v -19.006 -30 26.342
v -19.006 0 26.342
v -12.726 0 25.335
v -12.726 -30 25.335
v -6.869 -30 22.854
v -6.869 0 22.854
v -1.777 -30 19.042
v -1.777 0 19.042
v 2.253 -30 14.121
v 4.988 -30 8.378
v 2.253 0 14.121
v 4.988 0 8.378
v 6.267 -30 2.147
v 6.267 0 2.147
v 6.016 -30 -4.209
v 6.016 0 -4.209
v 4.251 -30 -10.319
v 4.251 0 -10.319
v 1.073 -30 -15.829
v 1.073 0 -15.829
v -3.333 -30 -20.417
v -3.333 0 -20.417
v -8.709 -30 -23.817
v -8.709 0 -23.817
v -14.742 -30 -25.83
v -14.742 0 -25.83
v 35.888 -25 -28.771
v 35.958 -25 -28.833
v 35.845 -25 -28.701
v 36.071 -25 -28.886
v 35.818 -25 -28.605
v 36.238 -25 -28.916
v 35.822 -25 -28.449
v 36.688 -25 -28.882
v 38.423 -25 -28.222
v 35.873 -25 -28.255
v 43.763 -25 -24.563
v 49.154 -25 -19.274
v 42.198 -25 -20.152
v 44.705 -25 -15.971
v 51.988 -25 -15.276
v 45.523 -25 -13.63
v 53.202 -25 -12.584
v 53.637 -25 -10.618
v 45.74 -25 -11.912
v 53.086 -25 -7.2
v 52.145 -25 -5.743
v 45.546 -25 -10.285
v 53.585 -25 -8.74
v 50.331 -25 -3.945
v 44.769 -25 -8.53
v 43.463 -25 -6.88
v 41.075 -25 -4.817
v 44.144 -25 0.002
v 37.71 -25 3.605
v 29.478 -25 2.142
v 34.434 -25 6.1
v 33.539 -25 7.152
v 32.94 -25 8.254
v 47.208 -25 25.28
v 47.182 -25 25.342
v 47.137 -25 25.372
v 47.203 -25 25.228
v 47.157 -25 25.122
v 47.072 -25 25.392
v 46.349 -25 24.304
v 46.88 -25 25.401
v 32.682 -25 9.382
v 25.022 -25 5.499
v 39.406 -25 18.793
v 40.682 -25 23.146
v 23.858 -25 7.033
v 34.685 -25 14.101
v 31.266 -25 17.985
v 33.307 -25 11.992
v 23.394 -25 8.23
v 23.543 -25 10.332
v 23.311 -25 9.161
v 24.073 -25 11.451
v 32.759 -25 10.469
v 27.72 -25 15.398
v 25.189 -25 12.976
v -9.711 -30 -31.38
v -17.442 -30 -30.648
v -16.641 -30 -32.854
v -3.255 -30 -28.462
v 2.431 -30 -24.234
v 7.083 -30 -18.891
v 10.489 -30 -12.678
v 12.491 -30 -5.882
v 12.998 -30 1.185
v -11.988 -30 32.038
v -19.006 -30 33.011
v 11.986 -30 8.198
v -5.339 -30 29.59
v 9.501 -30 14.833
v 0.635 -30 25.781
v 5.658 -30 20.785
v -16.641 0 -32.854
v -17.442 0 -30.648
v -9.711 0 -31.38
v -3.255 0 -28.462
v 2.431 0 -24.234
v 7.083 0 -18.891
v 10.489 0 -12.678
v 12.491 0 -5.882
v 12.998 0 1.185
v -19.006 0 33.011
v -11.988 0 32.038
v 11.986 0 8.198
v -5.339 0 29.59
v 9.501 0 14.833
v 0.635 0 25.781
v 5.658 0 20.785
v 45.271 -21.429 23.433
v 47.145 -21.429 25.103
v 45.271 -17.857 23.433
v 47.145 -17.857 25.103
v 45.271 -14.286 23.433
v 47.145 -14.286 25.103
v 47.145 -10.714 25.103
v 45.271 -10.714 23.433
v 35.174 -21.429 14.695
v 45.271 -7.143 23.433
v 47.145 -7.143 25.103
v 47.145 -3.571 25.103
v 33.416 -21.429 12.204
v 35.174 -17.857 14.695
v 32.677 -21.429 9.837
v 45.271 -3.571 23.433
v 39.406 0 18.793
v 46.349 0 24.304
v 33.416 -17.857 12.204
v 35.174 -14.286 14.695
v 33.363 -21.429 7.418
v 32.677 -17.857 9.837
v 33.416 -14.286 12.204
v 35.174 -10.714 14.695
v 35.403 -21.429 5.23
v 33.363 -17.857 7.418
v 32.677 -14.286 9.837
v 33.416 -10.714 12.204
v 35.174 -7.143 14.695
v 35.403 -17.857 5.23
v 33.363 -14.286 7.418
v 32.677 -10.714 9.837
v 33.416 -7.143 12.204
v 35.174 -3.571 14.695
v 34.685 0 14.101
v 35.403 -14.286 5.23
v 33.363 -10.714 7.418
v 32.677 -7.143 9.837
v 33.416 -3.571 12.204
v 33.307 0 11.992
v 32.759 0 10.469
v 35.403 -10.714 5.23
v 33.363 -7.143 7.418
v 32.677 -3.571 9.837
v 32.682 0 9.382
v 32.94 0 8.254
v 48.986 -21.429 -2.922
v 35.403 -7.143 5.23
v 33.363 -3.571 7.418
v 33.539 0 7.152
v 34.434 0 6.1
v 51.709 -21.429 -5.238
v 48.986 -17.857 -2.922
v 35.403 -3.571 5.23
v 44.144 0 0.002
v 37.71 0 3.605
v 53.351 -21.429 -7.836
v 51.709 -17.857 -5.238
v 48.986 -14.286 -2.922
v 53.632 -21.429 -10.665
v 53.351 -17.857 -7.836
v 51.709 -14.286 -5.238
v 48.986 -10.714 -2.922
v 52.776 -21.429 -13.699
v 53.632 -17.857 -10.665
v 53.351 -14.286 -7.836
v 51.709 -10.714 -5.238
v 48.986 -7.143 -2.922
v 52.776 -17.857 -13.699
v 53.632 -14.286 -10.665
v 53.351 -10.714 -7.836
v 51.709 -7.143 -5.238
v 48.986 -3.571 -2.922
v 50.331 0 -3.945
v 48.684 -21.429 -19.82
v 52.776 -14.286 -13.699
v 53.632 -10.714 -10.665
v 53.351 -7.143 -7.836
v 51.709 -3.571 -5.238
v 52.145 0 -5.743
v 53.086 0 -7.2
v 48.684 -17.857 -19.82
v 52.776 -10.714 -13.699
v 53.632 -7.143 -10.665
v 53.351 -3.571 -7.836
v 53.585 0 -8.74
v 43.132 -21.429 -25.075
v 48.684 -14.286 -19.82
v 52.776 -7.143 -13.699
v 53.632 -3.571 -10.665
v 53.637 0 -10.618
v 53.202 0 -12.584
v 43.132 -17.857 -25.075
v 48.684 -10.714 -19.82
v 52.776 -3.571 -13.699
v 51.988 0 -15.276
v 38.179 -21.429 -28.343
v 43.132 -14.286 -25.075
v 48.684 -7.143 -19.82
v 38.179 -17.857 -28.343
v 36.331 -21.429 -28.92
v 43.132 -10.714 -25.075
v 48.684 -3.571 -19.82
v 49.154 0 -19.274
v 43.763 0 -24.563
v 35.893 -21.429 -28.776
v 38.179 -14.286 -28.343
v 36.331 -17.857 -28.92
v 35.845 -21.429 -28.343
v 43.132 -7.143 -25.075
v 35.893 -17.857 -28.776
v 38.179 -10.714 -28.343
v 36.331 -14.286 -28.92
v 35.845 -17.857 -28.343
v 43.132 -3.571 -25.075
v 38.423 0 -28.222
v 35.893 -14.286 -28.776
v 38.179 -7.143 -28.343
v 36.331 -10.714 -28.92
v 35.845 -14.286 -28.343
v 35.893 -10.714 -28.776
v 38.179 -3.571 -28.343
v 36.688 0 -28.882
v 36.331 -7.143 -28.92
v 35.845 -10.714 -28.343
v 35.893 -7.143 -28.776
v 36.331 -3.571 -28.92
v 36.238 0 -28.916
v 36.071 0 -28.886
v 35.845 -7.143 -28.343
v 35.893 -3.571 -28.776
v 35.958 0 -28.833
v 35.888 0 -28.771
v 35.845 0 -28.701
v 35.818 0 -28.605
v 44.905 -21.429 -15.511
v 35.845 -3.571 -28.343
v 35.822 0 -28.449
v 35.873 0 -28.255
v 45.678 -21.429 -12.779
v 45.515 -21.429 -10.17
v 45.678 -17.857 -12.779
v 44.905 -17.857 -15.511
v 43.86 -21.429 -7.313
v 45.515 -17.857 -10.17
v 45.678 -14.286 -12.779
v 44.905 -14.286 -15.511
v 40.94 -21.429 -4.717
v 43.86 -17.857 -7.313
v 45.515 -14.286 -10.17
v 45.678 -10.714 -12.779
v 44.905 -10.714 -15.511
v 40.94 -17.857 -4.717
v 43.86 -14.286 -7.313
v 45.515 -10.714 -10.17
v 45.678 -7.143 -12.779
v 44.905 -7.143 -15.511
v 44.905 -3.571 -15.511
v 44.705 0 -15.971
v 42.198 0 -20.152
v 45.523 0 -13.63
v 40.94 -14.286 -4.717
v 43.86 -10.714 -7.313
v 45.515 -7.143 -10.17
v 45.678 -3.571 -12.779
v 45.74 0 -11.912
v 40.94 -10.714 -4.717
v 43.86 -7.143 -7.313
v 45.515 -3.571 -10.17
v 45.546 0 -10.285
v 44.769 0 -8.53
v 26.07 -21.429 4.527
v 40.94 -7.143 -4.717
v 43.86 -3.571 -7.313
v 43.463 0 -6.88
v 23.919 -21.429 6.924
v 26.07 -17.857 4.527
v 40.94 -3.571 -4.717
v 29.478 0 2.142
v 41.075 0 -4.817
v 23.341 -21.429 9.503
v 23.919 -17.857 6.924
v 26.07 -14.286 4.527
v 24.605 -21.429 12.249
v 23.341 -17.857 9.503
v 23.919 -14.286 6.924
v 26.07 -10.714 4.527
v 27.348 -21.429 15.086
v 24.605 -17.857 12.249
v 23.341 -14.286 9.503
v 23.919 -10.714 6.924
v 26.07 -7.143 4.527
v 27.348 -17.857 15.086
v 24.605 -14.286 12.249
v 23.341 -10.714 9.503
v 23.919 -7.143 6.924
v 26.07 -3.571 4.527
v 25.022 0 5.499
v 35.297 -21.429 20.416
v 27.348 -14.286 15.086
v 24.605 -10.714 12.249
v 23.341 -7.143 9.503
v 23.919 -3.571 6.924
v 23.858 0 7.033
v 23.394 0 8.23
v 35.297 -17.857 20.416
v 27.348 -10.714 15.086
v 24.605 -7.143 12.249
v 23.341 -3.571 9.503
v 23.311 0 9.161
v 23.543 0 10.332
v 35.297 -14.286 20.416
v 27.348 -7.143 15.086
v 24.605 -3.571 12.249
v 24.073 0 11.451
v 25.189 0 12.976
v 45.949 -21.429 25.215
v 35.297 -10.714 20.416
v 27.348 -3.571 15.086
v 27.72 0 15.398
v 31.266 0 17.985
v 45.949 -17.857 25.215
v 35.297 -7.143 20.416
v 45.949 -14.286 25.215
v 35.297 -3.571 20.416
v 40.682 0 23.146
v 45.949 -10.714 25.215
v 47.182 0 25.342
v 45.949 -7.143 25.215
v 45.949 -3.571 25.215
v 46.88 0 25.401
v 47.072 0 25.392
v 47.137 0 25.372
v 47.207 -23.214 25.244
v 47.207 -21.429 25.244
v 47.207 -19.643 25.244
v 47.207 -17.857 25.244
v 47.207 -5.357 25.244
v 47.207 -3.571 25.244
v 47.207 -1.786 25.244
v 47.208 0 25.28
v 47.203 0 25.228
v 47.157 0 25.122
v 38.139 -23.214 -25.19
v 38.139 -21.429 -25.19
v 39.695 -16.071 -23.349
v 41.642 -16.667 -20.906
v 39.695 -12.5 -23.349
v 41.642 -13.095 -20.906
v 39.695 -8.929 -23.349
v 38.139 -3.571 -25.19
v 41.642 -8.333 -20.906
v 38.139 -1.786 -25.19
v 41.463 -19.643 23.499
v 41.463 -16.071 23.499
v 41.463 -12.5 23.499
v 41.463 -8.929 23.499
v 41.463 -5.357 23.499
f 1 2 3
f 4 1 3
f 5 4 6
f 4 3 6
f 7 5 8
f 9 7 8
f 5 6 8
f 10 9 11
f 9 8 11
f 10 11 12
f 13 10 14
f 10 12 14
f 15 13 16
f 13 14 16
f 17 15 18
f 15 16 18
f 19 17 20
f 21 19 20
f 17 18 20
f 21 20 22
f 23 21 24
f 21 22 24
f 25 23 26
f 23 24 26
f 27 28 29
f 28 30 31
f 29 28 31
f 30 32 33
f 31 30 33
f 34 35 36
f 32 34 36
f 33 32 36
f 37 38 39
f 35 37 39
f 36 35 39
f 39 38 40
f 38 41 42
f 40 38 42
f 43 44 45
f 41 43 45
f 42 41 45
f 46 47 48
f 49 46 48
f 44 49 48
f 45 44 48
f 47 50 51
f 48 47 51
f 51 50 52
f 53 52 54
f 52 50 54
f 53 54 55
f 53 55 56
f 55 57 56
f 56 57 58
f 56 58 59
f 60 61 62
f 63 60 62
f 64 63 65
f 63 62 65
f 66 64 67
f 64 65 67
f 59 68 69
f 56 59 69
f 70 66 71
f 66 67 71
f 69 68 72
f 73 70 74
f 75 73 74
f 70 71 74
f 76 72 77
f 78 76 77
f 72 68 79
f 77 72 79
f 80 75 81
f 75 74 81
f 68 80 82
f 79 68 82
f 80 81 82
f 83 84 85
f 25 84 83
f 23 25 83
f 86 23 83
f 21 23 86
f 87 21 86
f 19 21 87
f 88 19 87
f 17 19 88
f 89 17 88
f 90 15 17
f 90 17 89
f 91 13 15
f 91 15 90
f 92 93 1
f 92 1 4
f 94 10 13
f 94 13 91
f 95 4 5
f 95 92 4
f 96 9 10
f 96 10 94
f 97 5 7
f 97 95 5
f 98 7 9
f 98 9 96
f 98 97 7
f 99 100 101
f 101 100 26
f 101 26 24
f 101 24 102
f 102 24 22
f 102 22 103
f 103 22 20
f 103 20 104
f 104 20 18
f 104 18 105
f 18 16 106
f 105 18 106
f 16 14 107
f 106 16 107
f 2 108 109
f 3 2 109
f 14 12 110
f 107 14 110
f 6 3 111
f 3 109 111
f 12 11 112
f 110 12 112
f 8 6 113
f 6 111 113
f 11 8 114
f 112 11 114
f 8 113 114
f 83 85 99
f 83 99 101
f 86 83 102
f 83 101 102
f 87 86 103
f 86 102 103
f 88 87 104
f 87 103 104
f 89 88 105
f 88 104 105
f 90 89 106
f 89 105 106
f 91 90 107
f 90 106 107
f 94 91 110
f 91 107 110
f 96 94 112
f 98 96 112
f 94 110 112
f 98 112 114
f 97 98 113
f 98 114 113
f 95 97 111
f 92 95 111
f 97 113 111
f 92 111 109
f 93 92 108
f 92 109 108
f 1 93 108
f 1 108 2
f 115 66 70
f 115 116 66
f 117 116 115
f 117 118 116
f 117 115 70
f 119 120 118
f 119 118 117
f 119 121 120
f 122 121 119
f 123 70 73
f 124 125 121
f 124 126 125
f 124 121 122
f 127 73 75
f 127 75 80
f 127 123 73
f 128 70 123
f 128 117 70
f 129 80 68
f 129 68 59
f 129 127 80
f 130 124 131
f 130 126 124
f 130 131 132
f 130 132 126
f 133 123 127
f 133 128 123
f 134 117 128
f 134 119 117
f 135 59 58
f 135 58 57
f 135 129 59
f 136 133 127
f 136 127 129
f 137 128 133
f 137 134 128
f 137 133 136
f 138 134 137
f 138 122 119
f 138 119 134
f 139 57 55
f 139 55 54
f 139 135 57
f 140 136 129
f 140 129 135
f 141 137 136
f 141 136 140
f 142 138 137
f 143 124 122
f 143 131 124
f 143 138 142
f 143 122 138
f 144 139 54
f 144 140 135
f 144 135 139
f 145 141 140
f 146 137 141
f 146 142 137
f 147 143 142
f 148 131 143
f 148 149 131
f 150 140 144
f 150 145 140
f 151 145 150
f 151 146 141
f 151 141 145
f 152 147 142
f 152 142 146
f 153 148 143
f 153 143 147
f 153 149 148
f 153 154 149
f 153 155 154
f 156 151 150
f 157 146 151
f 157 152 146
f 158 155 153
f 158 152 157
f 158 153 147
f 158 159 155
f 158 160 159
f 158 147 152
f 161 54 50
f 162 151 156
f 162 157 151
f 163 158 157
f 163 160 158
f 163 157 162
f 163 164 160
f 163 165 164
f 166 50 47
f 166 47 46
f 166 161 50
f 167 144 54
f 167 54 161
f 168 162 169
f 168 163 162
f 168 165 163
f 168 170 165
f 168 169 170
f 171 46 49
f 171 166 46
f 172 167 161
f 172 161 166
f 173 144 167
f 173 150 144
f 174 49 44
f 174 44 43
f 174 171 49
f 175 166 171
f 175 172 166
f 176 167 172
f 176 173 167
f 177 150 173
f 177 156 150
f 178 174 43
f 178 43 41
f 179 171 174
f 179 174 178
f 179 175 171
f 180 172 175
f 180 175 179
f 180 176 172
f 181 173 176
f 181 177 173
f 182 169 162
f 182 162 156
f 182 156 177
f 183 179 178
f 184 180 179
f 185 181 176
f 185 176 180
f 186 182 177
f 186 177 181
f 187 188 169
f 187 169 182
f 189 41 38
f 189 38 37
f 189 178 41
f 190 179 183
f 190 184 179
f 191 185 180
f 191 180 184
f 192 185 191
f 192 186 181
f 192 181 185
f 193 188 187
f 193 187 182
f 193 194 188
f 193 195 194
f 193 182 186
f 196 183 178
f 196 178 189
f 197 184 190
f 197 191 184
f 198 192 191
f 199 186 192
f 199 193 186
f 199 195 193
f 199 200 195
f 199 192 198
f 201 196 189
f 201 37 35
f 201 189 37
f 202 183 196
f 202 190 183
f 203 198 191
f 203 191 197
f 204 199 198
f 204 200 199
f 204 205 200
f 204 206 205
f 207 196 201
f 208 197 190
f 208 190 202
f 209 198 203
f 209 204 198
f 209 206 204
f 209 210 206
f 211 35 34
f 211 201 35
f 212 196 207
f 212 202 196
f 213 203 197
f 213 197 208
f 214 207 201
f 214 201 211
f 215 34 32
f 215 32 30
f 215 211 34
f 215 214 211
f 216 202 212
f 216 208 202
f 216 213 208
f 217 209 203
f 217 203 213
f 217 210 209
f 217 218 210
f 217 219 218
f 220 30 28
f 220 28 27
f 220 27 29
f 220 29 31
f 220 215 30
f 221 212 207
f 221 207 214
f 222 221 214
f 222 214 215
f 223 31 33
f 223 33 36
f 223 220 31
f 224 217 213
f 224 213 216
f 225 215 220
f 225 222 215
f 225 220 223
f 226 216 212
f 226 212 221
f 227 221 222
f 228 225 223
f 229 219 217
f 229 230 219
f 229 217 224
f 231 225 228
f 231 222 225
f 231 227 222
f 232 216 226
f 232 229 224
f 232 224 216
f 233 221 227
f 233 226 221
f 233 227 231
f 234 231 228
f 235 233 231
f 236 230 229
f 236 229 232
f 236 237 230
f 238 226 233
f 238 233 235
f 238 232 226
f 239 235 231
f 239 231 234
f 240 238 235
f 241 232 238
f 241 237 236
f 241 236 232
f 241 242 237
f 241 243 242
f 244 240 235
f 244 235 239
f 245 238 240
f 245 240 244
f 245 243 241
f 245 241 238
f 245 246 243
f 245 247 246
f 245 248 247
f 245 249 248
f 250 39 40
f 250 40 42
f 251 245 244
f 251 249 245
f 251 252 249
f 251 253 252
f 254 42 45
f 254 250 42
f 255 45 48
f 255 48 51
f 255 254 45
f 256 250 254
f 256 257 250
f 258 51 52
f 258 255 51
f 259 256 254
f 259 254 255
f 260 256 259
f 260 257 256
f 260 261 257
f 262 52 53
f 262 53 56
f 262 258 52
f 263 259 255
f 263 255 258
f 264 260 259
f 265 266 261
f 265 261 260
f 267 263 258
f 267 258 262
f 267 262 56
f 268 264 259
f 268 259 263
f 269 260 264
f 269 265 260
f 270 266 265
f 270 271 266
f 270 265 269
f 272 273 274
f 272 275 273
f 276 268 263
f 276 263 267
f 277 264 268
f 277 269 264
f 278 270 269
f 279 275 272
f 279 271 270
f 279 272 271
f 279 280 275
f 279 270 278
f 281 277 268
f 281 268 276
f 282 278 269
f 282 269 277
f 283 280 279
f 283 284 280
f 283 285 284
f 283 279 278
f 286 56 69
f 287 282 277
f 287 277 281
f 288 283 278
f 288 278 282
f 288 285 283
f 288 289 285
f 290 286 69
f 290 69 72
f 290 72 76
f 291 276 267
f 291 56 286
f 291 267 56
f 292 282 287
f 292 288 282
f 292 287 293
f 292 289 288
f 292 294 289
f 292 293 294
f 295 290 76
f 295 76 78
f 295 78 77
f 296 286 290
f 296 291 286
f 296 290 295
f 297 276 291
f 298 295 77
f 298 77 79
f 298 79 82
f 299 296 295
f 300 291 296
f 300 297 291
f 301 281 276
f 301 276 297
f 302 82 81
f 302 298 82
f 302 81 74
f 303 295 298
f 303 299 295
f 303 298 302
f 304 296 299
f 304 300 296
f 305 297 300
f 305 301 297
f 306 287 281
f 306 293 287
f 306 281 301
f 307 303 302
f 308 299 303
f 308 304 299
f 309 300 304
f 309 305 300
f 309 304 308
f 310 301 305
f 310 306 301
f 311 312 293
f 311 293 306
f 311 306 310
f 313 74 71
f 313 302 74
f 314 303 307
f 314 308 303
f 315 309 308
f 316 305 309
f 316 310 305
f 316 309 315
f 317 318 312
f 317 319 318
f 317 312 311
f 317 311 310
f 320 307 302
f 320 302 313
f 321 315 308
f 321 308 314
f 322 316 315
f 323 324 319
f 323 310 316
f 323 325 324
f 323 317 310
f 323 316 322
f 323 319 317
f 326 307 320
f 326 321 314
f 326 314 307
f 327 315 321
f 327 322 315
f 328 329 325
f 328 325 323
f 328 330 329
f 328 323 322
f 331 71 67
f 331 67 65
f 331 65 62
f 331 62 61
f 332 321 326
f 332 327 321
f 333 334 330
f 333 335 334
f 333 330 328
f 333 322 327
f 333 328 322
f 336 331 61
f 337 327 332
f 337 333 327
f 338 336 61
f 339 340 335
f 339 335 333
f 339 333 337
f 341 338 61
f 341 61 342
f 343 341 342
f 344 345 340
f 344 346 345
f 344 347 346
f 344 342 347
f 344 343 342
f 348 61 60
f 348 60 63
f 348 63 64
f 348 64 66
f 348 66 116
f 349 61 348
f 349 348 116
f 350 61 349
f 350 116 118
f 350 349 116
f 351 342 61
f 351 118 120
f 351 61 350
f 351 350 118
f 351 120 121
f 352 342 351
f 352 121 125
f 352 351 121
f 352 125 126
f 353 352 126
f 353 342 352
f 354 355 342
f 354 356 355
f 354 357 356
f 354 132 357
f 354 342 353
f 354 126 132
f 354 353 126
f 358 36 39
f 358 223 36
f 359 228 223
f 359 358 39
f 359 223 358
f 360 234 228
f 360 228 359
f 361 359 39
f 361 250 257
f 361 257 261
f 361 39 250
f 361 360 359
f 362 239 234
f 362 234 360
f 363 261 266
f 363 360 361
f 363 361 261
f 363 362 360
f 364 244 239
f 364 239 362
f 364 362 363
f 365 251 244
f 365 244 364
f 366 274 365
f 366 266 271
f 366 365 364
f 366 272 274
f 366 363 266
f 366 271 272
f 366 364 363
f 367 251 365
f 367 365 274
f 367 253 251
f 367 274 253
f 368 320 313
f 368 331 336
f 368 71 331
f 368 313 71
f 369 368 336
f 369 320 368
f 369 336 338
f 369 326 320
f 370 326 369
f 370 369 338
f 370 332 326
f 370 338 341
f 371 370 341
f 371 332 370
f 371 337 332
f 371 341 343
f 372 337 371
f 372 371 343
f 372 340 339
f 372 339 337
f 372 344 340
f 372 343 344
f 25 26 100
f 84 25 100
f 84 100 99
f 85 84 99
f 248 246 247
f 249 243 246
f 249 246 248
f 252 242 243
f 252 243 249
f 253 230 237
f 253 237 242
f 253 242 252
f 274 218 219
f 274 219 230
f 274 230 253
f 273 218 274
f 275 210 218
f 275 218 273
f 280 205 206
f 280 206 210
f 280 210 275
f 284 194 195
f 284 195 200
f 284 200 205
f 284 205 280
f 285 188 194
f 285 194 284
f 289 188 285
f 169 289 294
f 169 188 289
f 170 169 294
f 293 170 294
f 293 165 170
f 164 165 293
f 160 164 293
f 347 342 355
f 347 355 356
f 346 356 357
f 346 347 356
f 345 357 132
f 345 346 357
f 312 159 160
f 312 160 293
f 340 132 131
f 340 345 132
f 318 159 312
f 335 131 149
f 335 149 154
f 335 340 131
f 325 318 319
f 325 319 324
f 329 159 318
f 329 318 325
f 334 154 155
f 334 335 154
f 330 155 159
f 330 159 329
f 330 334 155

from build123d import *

# Parameters (mm, degrees)
F1_DEPTH    = 30
F3_DEPTH    = 25
F4_T1_DEPTH = 53.5744264442


# Not quite as in the source:
# - a fillet or chamfer that OpenCascade refuses, or shapes differently, is made with other operations: its cross-section is extruded or revolved along the edge and cut away or added


with BuildPart() as f1:
    # F0 (on Front) → F1 (new body)
    with BuildSketch(Plane.XZ):
        with BuildLine():
            ThreePointArc((-16.6409582285, -32.8538838982), (12.9980630113, 1.1851974836), (-19.0061628819, 33.010661602))
            Line((-19.0061628819, 33.010661602), (-19.0061628819, 26.3418406248))
            ThreePointArc((-19.0061628819, 26.3418406248), (6.3543491175, 0), (-19.0061628819, -26.3418406248))
            Line((-19.0061628819, -26.3418406248), (-16.6409582285, -32.8538838982))
        make_face()
    extrude(amount=F1_DEPTH)

    # F4: chamfer of 5 on 1 edges, made by hand

    # F4_s2 → F4_t1 (cut)
    with BuildSketch(Plane.XZ.offset(-11.7872132221)):
        with BuildLine():
            Line((-14.6446503408, -25.6553982115), (-17.5397526272, -30.822887852))
            Line((-17.5397526272, -30.822887852), (-17.6337449938, -30.8570263203))
            ThreePointArc((-17.6337449938, -30.8570263203), (-18.2957757245, -28.5906518321), (-19.1001552485, -26.3759790931))
            Line((-19.1001552485, -26.3759790931), (-19.0099575843, -26.2419126496))
            ThreePointArc((-19.0099575843, -26.2419126496), (-16.8171091828, -26.0664335828), (-14.664619643, -25.5574123606))
            Line((-14.664619643, -25.5574123606), (-14.6446503408, -25.6553982115))
        make_face()
    extrude(amount=F4_T1_DEPTH, mode=Mode.SUBTRACT)


with BuildPart() as f3:
    # F2 (on Front) → F3 (new body)
    with BuildSketch(Plane.XZ):
        with BuildLine():
            add(Edge.make_bspline(
                [(47.1818894148, 25.3415182233), (47.9254327879, 24.5473947838), (16.0534465301, 6.0583152168), (68.6264628565, -3.8046073263), (39.7238119127, -29.0846751765), (32.8029461038, -29.1373721142), (60.5747190986, -5.8473305783), (1.8881016249, 6.6933279117), (46.3185796912, 26.2635552043), (47.1818894148, 25.3415182233)],
                knots=[0, 0, 0, 0, 0.1452057039, 0.3095496455, 0.468709899, 0.5168545878, 0.6598315714, 0.8314052675, 1, 1, 1, 1], degree=3))
        make_face()
    extrude(amount=F3_DEPTH)


solid = Compound([f1.part, f3.part])
